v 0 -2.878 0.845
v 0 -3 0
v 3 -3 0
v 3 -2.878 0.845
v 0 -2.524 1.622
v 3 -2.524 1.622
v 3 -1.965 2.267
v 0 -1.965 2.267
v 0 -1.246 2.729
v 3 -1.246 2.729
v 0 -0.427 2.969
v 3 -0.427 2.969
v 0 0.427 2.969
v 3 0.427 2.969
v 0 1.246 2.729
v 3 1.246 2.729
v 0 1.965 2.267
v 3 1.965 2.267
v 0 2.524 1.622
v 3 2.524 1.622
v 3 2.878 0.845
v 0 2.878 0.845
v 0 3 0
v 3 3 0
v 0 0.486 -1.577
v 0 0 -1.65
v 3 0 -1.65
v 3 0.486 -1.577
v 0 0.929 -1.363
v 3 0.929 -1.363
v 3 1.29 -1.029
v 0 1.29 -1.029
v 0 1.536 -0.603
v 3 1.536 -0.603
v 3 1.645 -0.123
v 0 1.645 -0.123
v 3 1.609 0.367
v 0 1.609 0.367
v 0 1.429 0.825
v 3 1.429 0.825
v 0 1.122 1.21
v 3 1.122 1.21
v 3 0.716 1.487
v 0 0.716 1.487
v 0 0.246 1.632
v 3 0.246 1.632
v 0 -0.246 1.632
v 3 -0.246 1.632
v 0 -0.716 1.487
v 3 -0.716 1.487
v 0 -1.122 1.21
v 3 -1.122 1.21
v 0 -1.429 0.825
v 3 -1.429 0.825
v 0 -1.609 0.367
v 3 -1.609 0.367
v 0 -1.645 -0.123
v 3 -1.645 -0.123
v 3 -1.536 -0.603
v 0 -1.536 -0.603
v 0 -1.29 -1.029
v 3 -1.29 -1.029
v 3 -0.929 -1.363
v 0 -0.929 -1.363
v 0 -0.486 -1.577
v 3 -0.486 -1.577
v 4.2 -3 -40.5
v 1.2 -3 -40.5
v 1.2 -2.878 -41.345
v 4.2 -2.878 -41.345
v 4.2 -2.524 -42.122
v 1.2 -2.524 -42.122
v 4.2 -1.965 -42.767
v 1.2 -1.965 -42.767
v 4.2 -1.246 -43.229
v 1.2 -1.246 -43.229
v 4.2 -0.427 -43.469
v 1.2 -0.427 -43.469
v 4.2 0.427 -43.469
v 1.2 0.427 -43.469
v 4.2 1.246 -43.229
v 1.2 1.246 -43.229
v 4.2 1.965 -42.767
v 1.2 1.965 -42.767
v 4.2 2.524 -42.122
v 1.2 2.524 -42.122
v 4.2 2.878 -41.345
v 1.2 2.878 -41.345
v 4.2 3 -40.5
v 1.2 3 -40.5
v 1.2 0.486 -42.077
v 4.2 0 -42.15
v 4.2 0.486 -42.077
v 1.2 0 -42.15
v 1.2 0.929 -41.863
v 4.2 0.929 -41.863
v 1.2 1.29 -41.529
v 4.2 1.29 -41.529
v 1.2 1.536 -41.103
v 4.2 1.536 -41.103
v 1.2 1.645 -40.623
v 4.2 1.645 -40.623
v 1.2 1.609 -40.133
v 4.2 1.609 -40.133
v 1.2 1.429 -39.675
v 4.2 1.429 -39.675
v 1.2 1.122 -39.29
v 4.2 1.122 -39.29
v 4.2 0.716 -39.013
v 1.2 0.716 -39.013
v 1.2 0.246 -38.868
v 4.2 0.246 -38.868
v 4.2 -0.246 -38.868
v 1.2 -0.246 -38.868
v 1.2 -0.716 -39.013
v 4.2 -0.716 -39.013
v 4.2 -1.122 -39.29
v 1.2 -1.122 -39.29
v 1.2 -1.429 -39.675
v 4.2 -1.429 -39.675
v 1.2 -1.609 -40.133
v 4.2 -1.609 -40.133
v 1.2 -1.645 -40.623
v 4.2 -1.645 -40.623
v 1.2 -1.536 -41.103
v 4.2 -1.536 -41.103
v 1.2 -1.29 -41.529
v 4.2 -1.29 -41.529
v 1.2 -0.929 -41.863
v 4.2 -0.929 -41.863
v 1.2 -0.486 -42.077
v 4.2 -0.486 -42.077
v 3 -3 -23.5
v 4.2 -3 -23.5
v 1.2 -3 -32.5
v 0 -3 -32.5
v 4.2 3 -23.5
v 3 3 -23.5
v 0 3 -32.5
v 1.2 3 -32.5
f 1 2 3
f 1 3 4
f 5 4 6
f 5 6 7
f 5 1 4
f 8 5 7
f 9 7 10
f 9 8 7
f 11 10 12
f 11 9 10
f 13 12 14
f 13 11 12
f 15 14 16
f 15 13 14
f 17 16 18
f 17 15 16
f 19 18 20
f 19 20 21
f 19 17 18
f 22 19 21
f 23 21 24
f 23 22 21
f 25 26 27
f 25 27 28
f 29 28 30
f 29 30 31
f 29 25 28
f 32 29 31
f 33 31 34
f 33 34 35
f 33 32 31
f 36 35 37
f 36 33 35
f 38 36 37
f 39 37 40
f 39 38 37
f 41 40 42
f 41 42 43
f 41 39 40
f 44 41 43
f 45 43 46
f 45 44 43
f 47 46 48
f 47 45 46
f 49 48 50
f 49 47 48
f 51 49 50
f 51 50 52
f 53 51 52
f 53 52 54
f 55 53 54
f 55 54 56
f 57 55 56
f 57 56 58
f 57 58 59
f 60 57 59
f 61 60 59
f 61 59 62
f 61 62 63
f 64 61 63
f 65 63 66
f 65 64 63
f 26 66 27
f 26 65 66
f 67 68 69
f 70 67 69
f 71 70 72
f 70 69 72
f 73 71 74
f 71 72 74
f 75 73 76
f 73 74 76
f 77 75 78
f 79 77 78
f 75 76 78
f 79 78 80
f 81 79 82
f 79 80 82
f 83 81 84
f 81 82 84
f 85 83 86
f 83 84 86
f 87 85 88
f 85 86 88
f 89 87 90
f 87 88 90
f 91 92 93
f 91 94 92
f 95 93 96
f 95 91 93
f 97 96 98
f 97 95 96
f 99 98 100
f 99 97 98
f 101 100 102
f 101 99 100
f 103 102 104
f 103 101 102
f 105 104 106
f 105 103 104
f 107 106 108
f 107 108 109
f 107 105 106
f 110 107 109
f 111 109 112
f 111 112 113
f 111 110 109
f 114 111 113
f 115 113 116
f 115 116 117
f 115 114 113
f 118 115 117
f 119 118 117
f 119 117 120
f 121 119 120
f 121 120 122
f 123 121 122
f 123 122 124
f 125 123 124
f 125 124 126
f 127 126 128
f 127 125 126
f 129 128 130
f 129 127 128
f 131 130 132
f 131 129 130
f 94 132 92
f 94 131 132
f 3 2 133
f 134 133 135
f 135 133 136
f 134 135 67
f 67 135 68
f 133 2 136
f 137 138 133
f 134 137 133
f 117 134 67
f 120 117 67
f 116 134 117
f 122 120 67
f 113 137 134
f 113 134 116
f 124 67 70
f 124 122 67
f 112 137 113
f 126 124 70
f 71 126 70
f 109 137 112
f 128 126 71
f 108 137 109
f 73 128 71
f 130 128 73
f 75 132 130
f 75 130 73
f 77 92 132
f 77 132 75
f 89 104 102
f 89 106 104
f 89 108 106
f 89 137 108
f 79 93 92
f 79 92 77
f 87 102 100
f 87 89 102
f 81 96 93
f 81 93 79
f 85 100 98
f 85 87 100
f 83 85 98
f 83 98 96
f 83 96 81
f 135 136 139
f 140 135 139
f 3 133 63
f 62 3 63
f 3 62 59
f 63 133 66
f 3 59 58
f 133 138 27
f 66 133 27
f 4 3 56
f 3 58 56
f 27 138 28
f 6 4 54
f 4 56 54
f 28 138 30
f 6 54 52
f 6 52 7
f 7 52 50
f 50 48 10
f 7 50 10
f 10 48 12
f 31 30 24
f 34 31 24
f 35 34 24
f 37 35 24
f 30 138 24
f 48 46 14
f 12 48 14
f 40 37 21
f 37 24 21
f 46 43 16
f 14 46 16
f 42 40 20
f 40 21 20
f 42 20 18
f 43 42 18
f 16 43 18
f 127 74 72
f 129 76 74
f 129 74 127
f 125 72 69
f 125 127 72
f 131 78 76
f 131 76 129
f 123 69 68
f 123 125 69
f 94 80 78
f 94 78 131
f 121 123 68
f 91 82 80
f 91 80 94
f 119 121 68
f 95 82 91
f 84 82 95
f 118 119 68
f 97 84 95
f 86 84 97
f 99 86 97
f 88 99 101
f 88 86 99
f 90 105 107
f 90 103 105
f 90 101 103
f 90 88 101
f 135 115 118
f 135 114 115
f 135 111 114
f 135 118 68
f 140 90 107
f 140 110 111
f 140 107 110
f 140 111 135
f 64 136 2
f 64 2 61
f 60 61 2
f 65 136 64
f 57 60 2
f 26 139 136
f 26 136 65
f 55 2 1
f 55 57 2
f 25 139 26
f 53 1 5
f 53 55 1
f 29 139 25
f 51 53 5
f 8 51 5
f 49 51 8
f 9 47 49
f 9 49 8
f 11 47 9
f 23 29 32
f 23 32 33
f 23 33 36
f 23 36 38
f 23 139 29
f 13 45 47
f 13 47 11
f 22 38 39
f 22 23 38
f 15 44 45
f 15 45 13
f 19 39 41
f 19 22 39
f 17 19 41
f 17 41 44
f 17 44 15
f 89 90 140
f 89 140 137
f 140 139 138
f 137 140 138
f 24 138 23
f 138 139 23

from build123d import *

# Parameters (mm, degrees)
SKETCH1_R           = 1.65
BOSS_EXTRUDE1_DEPTH = 3
SKETCH3_W           = 11
SKETCH3_H           = 6
CUT_EXTRUDE2_DEPTH  = 1.2
SKETCH4_R           = 1.65
BOSS_EXTRUDE2_DEPTH = 1.2


with BuildPart() as part:
    # Sketch1 → Boss-Extrude1 (new body)
    with BuildSketch(Plane(origin=(0, 0, 0), x_dir=(0, 0, -1), z_dir=(1, 0, 0))):
        with BuildLine():
            Line((0, 3), (40.5, 3))
            ThreePointArc((40.5, 3), (43.5, 0), (40.5, -3))
            Line((40.5, -3), (0, -3))
            ThreePointArc((0, -3), (-3, 0), (0, 3))
        make_face()
        Circle(SKETCH1_R, mode=Mode.SUBTRACT)
        with Locations((40.5, 0)):
            Circle(SKETCH1_R, mode=Mode.SUBTRACT)
    extrude(amount=BOSS_EXTRUDE1_DEPTH)

    # Sketch3 → Cut-Extrude2 (cut)
    with BuildSketch(Plane.ZY):
        with Locations((-38, 0)):
            Rectangle(SKETCH3_W, SKETCH3_H)
    extrude(amount=-CUT_EXTRUDE2_DEPTH, mode=Mode.SUBTRACT)

    # Sketch4 → Boss-Extrude2 (add)
    with BuildSketch(Plane(origin=(3, 0, 0), x_dir=(0, 0, -1), z_dir=(1, 0, 0))):
        with BuildLine():
            Line((40.5, 3), (23.5, 3))
            Line((23.5, 3), (23.5, -3))
            Line((23.5, -3), (40.5, -3))
            ThreePointArc((40.5, -3), (43.5, 0), (40.5, 3))
        make_face()
        with Locations((40.5, 0)):
            Circle(SKETCH4_R, mode=Mode.SUBTRACT)
    extrude(amount=BOSS_EXTRUDE2_DEPTH)


solid = part.part
